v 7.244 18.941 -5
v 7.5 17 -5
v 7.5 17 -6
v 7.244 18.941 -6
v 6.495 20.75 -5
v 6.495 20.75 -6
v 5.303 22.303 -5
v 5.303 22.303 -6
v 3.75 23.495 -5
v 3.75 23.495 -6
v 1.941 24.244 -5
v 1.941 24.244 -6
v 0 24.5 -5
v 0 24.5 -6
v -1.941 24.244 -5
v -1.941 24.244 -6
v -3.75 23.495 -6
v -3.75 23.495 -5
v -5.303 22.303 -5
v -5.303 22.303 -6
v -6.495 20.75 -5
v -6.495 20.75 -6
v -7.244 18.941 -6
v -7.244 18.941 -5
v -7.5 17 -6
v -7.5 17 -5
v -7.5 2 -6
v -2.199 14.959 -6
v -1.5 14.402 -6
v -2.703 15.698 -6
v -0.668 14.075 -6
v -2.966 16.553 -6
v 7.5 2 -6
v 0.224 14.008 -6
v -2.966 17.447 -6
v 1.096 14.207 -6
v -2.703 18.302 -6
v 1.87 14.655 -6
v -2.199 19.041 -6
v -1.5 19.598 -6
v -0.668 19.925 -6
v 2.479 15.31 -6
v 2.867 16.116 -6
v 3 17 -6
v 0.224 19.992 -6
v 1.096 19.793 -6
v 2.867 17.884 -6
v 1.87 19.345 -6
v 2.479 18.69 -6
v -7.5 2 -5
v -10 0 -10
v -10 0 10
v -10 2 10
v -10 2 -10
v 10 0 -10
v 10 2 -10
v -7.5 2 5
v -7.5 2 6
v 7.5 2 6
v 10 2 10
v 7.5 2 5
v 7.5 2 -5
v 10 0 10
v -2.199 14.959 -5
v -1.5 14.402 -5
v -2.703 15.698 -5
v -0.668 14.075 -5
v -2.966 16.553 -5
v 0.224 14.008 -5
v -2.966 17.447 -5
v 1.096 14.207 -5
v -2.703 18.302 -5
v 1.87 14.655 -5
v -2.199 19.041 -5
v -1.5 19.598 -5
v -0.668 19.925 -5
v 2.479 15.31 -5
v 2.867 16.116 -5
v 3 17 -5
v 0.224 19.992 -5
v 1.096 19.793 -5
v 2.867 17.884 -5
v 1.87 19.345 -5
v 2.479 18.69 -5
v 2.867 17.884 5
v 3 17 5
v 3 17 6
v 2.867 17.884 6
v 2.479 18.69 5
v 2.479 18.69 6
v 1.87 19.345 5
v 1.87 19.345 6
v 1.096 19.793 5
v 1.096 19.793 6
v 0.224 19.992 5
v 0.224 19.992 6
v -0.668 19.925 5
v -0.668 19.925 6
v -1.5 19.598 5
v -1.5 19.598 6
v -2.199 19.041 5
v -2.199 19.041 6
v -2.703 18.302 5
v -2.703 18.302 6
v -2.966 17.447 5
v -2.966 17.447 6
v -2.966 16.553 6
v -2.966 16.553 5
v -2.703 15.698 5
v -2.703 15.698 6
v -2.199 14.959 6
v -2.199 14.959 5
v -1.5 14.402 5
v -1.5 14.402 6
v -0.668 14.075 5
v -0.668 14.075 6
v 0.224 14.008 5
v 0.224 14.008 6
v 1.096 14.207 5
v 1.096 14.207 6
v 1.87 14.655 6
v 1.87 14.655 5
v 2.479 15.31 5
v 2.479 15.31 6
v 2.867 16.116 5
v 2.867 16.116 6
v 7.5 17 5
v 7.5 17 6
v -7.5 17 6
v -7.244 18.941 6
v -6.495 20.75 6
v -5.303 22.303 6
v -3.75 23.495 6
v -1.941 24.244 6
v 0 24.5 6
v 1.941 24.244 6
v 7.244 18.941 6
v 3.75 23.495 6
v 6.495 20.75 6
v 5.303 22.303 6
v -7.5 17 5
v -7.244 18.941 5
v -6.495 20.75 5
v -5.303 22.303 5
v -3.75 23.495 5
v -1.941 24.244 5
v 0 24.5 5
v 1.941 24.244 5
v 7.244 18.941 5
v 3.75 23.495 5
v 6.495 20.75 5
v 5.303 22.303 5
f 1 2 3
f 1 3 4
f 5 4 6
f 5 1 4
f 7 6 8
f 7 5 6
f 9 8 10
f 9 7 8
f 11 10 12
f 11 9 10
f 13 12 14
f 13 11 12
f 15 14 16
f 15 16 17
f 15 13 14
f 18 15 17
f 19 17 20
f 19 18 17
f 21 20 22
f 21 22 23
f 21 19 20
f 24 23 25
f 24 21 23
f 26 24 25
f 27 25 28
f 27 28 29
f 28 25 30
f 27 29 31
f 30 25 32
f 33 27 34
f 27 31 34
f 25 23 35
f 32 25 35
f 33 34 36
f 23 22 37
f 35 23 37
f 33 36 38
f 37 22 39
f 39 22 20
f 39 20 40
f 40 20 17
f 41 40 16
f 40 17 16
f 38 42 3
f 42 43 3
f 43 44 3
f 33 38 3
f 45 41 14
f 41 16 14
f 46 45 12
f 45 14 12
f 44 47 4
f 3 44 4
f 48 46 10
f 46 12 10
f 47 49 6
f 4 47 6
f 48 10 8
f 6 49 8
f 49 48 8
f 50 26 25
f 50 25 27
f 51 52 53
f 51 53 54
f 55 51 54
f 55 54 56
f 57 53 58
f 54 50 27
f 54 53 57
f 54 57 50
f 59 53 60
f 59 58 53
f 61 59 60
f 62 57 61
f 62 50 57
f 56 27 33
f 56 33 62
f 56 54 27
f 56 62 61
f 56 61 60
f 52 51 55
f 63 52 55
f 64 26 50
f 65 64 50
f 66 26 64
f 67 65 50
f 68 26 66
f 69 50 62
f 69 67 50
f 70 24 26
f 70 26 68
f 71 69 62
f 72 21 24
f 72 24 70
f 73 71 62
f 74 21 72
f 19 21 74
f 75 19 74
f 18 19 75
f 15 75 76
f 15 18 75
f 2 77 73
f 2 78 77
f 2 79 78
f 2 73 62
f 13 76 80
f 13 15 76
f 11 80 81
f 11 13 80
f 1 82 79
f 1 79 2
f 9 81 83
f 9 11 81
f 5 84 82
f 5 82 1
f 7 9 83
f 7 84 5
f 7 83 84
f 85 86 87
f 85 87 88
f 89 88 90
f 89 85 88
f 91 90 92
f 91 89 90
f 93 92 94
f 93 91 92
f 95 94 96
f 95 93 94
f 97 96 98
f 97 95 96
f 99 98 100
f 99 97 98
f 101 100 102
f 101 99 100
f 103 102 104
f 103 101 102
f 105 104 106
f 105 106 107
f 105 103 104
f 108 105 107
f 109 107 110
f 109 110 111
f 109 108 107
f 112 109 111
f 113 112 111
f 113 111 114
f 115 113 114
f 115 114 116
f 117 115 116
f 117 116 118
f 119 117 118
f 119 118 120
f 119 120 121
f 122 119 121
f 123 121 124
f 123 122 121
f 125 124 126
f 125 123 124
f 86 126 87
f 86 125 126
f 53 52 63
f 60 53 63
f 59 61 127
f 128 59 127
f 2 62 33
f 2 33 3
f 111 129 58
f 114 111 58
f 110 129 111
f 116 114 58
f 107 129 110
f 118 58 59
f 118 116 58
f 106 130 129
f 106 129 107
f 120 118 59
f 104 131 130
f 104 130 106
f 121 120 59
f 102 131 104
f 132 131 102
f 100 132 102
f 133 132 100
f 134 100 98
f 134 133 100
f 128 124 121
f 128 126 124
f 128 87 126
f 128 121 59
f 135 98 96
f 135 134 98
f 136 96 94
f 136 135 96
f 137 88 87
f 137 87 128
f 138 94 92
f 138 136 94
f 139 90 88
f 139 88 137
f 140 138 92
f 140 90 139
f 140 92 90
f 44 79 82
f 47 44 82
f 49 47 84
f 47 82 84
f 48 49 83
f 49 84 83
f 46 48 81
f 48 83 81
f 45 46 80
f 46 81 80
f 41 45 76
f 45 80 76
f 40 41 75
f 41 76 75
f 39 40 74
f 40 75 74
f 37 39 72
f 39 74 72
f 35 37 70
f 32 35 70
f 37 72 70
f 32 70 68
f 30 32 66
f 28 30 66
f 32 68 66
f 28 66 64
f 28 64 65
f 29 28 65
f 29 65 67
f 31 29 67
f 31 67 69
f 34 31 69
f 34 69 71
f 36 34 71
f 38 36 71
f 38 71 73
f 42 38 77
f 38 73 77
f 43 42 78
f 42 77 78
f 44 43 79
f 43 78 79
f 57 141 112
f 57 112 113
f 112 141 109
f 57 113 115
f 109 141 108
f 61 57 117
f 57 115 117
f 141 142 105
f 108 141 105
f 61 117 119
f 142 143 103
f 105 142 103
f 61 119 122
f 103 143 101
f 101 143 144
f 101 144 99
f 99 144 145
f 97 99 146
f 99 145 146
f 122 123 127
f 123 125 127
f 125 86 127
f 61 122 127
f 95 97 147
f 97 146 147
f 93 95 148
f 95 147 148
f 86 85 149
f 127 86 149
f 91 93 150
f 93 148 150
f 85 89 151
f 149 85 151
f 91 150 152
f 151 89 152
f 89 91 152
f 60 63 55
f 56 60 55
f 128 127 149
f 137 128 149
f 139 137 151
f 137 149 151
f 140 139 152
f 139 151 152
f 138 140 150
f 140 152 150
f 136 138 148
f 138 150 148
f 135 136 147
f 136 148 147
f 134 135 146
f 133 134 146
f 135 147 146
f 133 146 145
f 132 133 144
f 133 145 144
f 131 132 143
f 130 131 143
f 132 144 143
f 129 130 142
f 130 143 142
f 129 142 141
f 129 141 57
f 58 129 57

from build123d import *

# Parameters (mm, degrees)
SKETCH1_W           = 20
SKETCH1_H           = 20
BOSS_EXTRUDE1_DEPTH = 2
SKETCH4_R           = 3
BOSS_EXTRUDE2_DEPTH = 1


with BuildPart() as part:
    # Sketch1 → Boss-Extrude1 (new body)
    with BuildSketch(Plane(origin=(0, 0, 0), x_dir=(1, 0, 0), z_dir=(0, 1, 0))):
        Rectangle(SKETCH1_W, SKETCH1_H)
    extrude(amount=BOSS_EXTRUDE1_DEPTH)

    # Sketch4 → Boss-Extrude2 (add)
    with BuildSketch(Plane.XY.offset(5)):
        with BuildLine():
            Line((-7.5, 17), (-7.5, 2))
            Line((-7.5, 2), (7.5, 2))
            Line((7.5, 2), (7.5, 17))
            ThreePointArc((7.5, 17), (0, 24.5), (-7.5, 17))
        make_face()
        with Locations((0, 17)):
            Circle(SKETCH4_R, mode=Mode.SUBTRACT)
    boss_extrude2 = extrude(amount=BOSS_EXTRUDE2_DEPTH)

    # Mirror1: Boss-Extrude2 across plane
    add(boss_extrude2.mirror(Plane.XY))


solid = part.part
